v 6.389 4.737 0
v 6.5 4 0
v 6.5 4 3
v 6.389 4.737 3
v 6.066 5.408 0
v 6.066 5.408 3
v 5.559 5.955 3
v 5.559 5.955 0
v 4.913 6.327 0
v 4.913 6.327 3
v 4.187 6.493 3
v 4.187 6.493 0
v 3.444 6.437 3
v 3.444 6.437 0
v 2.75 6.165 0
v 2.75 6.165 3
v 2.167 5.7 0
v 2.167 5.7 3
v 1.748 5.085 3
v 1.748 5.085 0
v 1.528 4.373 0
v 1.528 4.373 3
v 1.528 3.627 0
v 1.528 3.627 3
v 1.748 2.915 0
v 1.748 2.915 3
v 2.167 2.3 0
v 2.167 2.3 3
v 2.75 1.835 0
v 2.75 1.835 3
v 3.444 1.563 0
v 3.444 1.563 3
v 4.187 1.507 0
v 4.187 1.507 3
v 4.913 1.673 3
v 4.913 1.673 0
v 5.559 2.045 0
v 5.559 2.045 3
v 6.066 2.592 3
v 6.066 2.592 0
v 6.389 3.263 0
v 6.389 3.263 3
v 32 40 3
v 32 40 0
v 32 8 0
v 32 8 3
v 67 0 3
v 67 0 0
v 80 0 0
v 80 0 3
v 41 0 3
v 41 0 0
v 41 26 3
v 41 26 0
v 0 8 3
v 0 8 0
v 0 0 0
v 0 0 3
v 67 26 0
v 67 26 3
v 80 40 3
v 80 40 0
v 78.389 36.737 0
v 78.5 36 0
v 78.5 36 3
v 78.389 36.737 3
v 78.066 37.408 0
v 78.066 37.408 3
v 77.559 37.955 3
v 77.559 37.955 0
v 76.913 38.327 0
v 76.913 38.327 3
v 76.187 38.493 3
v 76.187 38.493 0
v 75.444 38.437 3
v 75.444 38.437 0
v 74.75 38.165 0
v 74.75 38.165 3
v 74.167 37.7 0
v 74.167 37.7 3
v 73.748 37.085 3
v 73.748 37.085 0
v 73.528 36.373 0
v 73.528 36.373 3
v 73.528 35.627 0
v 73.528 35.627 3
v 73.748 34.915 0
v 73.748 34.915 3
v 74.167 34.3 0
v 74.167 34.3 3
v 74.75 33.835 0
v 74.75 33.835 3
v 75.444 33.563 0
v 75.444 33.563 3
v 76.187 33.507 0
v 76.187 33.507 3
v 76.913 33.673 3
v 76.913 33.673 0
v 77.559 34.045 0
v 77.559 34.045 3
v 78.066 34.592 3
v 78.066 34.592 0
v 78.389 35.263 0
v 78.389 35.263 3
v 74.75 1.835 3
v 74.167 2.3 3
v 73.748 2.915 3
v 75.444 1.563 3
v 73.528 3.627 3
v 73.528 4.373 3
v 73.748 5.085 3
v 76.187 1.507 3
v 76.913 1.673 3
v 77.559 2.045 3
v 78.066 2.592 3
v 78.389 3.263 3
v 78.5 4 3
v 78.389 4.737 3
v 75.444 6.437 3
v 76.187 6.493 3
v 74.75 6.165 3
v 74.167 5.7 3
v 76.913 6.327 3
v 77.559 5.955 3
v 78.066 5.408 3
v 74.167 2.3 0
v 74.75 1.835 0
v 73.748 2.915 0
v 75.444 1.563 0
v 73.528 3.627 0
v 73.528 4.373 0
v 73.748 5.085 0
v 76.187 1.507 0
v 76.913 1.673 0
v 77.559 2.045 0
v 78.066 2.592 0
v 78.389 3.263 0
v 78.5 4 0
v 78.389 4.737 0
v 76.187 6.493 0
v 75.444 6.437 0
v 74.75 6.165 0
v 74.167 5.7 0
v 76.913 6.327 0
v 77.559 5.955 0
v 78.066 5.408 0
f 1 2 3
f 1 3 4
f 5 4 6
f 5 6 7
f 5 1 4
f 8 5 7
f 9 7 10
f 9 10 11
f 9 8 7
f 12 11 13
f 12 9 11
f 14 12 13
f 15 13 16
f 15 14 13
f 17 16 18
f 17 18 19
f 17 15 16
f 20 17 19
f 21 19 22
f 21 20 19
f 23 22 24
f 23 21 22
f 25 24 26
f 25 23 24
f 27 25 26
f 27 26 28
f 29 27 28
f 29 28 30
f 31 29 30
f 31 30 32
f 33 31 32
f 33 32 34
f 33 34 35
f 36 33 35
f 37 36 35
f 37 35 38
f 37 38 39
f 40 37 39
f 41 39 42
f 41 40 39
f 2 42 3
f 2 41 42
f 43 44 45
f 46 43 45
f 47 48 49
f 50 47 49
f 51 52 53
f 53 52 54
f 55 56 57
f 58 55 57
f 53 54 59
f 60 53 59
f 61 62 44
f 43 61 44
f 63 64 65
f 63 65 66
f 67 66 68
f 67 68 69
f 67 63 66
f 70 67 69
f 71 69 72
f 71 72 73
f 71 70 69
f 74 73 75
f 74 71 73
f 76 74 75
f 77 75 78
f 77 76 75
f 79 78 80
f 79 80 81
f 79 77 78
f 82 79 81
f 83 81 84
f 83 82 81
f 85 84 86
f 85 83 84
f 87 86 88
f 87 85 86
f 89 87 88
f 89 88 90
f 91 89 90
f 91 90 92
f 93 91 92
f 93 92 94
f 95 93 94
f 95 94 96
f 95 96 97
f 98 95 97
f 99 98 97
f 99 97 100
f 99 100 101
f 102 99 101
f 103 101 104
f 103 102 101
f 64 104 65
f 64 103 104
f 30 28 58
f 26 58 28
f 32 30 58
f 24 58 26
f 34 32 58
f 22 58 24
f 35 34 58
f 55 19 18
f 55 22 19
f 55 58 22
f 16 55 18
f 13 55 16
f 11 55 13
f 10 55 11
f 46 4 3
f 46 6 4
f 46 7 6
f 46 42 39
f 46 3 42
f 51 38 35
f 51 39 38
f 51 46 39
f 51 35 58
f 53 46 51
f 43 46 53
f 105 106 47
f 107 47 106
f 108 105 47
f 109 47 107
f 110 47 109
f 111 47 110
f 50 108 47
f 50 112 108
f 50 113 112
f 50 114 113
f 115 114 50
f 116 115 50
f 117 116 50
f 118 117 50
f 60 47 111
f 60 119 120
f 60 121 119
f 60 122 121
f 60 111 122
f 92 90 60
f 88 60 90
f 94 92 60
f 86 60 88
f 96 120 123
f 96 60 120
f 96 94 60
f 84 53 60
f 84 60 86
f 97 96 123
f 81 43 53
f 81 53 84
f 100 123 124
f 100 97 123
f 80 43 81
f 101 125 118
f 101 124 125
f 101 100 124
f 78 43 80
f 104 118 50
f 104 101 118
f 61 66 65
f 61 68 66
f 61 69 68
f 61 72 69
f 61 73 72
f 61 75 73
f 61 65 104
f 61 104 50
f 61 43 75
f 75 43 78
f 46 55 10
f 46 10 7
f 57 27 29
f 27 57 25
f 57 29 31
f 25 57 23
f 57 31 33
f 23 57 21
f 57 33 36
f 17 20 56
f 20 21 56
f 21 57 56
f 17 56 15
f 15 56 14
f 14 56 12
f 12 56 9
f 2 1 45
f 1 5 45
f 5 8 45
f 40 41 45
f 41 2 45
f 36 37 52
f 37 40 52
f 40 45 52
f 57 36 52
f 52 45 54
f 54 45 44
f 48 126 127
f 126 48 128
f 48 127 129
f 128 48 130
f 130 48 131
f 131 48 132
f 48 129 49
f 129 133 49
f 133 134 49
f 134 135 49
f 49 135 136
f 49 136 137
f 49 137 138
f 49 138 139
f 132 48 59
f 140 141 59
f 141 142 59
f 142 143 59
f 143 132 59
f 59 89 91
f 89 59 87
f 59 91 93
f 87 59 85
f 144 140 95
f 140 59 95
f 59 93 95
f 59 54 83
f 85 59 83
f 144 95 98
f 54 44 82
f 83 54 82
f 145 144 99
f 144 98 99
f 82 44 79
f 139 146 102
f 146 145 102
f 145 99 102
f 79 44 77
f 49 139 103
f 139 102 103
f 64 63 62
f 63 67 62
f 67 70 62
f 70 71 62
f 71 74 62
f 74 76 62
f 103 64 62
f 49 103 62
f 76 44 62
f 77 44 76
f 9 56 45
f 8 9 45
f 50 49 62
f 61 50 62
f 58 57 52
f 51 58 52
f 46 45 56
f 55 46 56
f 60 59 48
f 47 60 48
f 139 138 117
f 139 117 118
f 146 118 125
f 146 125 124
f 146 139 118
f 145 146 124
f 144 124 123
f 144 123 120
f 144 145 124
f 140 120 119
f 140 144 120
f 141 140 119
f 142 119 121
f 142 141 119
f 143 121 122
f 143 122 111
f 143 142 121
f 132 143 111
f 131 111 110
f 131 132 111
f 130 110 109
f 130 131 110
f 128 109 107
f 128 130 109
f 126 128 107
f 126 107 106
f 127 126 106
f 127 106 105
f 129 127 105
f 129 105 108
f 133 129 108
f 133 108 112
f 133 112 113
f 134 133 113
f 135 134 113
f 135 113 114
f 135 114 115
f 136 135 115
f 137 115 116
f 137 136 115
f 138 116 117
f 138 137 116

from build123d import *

# Parameters (mm, degrees)
F0_R     = 2.5
F1_DEPTH = 3


with BuildPart() as f1:
    # F0 (on Top) → F1 (new body)
    with BuildSketch(Plane.XY):
        Polygon((0, 8), (0, 0), (41, 0), (41, 26), (67, 26), (67, 0), (80, 0), (80, 40), (32, 40), (32, 8), align=None)
        with Locations((4, 4)):
            Circle(F0_R, mode=Mode.SUBTRACT)
        with Locations((76, 4)):
            Circle(F0_R, mode=Mode.SUBTRACT)
        with Locations((76, 36)):
            Circle(F0_R, mode=Mode.SUBTRACT)
    extrude(amount=F1_DEPTH)


solid = f1.part
